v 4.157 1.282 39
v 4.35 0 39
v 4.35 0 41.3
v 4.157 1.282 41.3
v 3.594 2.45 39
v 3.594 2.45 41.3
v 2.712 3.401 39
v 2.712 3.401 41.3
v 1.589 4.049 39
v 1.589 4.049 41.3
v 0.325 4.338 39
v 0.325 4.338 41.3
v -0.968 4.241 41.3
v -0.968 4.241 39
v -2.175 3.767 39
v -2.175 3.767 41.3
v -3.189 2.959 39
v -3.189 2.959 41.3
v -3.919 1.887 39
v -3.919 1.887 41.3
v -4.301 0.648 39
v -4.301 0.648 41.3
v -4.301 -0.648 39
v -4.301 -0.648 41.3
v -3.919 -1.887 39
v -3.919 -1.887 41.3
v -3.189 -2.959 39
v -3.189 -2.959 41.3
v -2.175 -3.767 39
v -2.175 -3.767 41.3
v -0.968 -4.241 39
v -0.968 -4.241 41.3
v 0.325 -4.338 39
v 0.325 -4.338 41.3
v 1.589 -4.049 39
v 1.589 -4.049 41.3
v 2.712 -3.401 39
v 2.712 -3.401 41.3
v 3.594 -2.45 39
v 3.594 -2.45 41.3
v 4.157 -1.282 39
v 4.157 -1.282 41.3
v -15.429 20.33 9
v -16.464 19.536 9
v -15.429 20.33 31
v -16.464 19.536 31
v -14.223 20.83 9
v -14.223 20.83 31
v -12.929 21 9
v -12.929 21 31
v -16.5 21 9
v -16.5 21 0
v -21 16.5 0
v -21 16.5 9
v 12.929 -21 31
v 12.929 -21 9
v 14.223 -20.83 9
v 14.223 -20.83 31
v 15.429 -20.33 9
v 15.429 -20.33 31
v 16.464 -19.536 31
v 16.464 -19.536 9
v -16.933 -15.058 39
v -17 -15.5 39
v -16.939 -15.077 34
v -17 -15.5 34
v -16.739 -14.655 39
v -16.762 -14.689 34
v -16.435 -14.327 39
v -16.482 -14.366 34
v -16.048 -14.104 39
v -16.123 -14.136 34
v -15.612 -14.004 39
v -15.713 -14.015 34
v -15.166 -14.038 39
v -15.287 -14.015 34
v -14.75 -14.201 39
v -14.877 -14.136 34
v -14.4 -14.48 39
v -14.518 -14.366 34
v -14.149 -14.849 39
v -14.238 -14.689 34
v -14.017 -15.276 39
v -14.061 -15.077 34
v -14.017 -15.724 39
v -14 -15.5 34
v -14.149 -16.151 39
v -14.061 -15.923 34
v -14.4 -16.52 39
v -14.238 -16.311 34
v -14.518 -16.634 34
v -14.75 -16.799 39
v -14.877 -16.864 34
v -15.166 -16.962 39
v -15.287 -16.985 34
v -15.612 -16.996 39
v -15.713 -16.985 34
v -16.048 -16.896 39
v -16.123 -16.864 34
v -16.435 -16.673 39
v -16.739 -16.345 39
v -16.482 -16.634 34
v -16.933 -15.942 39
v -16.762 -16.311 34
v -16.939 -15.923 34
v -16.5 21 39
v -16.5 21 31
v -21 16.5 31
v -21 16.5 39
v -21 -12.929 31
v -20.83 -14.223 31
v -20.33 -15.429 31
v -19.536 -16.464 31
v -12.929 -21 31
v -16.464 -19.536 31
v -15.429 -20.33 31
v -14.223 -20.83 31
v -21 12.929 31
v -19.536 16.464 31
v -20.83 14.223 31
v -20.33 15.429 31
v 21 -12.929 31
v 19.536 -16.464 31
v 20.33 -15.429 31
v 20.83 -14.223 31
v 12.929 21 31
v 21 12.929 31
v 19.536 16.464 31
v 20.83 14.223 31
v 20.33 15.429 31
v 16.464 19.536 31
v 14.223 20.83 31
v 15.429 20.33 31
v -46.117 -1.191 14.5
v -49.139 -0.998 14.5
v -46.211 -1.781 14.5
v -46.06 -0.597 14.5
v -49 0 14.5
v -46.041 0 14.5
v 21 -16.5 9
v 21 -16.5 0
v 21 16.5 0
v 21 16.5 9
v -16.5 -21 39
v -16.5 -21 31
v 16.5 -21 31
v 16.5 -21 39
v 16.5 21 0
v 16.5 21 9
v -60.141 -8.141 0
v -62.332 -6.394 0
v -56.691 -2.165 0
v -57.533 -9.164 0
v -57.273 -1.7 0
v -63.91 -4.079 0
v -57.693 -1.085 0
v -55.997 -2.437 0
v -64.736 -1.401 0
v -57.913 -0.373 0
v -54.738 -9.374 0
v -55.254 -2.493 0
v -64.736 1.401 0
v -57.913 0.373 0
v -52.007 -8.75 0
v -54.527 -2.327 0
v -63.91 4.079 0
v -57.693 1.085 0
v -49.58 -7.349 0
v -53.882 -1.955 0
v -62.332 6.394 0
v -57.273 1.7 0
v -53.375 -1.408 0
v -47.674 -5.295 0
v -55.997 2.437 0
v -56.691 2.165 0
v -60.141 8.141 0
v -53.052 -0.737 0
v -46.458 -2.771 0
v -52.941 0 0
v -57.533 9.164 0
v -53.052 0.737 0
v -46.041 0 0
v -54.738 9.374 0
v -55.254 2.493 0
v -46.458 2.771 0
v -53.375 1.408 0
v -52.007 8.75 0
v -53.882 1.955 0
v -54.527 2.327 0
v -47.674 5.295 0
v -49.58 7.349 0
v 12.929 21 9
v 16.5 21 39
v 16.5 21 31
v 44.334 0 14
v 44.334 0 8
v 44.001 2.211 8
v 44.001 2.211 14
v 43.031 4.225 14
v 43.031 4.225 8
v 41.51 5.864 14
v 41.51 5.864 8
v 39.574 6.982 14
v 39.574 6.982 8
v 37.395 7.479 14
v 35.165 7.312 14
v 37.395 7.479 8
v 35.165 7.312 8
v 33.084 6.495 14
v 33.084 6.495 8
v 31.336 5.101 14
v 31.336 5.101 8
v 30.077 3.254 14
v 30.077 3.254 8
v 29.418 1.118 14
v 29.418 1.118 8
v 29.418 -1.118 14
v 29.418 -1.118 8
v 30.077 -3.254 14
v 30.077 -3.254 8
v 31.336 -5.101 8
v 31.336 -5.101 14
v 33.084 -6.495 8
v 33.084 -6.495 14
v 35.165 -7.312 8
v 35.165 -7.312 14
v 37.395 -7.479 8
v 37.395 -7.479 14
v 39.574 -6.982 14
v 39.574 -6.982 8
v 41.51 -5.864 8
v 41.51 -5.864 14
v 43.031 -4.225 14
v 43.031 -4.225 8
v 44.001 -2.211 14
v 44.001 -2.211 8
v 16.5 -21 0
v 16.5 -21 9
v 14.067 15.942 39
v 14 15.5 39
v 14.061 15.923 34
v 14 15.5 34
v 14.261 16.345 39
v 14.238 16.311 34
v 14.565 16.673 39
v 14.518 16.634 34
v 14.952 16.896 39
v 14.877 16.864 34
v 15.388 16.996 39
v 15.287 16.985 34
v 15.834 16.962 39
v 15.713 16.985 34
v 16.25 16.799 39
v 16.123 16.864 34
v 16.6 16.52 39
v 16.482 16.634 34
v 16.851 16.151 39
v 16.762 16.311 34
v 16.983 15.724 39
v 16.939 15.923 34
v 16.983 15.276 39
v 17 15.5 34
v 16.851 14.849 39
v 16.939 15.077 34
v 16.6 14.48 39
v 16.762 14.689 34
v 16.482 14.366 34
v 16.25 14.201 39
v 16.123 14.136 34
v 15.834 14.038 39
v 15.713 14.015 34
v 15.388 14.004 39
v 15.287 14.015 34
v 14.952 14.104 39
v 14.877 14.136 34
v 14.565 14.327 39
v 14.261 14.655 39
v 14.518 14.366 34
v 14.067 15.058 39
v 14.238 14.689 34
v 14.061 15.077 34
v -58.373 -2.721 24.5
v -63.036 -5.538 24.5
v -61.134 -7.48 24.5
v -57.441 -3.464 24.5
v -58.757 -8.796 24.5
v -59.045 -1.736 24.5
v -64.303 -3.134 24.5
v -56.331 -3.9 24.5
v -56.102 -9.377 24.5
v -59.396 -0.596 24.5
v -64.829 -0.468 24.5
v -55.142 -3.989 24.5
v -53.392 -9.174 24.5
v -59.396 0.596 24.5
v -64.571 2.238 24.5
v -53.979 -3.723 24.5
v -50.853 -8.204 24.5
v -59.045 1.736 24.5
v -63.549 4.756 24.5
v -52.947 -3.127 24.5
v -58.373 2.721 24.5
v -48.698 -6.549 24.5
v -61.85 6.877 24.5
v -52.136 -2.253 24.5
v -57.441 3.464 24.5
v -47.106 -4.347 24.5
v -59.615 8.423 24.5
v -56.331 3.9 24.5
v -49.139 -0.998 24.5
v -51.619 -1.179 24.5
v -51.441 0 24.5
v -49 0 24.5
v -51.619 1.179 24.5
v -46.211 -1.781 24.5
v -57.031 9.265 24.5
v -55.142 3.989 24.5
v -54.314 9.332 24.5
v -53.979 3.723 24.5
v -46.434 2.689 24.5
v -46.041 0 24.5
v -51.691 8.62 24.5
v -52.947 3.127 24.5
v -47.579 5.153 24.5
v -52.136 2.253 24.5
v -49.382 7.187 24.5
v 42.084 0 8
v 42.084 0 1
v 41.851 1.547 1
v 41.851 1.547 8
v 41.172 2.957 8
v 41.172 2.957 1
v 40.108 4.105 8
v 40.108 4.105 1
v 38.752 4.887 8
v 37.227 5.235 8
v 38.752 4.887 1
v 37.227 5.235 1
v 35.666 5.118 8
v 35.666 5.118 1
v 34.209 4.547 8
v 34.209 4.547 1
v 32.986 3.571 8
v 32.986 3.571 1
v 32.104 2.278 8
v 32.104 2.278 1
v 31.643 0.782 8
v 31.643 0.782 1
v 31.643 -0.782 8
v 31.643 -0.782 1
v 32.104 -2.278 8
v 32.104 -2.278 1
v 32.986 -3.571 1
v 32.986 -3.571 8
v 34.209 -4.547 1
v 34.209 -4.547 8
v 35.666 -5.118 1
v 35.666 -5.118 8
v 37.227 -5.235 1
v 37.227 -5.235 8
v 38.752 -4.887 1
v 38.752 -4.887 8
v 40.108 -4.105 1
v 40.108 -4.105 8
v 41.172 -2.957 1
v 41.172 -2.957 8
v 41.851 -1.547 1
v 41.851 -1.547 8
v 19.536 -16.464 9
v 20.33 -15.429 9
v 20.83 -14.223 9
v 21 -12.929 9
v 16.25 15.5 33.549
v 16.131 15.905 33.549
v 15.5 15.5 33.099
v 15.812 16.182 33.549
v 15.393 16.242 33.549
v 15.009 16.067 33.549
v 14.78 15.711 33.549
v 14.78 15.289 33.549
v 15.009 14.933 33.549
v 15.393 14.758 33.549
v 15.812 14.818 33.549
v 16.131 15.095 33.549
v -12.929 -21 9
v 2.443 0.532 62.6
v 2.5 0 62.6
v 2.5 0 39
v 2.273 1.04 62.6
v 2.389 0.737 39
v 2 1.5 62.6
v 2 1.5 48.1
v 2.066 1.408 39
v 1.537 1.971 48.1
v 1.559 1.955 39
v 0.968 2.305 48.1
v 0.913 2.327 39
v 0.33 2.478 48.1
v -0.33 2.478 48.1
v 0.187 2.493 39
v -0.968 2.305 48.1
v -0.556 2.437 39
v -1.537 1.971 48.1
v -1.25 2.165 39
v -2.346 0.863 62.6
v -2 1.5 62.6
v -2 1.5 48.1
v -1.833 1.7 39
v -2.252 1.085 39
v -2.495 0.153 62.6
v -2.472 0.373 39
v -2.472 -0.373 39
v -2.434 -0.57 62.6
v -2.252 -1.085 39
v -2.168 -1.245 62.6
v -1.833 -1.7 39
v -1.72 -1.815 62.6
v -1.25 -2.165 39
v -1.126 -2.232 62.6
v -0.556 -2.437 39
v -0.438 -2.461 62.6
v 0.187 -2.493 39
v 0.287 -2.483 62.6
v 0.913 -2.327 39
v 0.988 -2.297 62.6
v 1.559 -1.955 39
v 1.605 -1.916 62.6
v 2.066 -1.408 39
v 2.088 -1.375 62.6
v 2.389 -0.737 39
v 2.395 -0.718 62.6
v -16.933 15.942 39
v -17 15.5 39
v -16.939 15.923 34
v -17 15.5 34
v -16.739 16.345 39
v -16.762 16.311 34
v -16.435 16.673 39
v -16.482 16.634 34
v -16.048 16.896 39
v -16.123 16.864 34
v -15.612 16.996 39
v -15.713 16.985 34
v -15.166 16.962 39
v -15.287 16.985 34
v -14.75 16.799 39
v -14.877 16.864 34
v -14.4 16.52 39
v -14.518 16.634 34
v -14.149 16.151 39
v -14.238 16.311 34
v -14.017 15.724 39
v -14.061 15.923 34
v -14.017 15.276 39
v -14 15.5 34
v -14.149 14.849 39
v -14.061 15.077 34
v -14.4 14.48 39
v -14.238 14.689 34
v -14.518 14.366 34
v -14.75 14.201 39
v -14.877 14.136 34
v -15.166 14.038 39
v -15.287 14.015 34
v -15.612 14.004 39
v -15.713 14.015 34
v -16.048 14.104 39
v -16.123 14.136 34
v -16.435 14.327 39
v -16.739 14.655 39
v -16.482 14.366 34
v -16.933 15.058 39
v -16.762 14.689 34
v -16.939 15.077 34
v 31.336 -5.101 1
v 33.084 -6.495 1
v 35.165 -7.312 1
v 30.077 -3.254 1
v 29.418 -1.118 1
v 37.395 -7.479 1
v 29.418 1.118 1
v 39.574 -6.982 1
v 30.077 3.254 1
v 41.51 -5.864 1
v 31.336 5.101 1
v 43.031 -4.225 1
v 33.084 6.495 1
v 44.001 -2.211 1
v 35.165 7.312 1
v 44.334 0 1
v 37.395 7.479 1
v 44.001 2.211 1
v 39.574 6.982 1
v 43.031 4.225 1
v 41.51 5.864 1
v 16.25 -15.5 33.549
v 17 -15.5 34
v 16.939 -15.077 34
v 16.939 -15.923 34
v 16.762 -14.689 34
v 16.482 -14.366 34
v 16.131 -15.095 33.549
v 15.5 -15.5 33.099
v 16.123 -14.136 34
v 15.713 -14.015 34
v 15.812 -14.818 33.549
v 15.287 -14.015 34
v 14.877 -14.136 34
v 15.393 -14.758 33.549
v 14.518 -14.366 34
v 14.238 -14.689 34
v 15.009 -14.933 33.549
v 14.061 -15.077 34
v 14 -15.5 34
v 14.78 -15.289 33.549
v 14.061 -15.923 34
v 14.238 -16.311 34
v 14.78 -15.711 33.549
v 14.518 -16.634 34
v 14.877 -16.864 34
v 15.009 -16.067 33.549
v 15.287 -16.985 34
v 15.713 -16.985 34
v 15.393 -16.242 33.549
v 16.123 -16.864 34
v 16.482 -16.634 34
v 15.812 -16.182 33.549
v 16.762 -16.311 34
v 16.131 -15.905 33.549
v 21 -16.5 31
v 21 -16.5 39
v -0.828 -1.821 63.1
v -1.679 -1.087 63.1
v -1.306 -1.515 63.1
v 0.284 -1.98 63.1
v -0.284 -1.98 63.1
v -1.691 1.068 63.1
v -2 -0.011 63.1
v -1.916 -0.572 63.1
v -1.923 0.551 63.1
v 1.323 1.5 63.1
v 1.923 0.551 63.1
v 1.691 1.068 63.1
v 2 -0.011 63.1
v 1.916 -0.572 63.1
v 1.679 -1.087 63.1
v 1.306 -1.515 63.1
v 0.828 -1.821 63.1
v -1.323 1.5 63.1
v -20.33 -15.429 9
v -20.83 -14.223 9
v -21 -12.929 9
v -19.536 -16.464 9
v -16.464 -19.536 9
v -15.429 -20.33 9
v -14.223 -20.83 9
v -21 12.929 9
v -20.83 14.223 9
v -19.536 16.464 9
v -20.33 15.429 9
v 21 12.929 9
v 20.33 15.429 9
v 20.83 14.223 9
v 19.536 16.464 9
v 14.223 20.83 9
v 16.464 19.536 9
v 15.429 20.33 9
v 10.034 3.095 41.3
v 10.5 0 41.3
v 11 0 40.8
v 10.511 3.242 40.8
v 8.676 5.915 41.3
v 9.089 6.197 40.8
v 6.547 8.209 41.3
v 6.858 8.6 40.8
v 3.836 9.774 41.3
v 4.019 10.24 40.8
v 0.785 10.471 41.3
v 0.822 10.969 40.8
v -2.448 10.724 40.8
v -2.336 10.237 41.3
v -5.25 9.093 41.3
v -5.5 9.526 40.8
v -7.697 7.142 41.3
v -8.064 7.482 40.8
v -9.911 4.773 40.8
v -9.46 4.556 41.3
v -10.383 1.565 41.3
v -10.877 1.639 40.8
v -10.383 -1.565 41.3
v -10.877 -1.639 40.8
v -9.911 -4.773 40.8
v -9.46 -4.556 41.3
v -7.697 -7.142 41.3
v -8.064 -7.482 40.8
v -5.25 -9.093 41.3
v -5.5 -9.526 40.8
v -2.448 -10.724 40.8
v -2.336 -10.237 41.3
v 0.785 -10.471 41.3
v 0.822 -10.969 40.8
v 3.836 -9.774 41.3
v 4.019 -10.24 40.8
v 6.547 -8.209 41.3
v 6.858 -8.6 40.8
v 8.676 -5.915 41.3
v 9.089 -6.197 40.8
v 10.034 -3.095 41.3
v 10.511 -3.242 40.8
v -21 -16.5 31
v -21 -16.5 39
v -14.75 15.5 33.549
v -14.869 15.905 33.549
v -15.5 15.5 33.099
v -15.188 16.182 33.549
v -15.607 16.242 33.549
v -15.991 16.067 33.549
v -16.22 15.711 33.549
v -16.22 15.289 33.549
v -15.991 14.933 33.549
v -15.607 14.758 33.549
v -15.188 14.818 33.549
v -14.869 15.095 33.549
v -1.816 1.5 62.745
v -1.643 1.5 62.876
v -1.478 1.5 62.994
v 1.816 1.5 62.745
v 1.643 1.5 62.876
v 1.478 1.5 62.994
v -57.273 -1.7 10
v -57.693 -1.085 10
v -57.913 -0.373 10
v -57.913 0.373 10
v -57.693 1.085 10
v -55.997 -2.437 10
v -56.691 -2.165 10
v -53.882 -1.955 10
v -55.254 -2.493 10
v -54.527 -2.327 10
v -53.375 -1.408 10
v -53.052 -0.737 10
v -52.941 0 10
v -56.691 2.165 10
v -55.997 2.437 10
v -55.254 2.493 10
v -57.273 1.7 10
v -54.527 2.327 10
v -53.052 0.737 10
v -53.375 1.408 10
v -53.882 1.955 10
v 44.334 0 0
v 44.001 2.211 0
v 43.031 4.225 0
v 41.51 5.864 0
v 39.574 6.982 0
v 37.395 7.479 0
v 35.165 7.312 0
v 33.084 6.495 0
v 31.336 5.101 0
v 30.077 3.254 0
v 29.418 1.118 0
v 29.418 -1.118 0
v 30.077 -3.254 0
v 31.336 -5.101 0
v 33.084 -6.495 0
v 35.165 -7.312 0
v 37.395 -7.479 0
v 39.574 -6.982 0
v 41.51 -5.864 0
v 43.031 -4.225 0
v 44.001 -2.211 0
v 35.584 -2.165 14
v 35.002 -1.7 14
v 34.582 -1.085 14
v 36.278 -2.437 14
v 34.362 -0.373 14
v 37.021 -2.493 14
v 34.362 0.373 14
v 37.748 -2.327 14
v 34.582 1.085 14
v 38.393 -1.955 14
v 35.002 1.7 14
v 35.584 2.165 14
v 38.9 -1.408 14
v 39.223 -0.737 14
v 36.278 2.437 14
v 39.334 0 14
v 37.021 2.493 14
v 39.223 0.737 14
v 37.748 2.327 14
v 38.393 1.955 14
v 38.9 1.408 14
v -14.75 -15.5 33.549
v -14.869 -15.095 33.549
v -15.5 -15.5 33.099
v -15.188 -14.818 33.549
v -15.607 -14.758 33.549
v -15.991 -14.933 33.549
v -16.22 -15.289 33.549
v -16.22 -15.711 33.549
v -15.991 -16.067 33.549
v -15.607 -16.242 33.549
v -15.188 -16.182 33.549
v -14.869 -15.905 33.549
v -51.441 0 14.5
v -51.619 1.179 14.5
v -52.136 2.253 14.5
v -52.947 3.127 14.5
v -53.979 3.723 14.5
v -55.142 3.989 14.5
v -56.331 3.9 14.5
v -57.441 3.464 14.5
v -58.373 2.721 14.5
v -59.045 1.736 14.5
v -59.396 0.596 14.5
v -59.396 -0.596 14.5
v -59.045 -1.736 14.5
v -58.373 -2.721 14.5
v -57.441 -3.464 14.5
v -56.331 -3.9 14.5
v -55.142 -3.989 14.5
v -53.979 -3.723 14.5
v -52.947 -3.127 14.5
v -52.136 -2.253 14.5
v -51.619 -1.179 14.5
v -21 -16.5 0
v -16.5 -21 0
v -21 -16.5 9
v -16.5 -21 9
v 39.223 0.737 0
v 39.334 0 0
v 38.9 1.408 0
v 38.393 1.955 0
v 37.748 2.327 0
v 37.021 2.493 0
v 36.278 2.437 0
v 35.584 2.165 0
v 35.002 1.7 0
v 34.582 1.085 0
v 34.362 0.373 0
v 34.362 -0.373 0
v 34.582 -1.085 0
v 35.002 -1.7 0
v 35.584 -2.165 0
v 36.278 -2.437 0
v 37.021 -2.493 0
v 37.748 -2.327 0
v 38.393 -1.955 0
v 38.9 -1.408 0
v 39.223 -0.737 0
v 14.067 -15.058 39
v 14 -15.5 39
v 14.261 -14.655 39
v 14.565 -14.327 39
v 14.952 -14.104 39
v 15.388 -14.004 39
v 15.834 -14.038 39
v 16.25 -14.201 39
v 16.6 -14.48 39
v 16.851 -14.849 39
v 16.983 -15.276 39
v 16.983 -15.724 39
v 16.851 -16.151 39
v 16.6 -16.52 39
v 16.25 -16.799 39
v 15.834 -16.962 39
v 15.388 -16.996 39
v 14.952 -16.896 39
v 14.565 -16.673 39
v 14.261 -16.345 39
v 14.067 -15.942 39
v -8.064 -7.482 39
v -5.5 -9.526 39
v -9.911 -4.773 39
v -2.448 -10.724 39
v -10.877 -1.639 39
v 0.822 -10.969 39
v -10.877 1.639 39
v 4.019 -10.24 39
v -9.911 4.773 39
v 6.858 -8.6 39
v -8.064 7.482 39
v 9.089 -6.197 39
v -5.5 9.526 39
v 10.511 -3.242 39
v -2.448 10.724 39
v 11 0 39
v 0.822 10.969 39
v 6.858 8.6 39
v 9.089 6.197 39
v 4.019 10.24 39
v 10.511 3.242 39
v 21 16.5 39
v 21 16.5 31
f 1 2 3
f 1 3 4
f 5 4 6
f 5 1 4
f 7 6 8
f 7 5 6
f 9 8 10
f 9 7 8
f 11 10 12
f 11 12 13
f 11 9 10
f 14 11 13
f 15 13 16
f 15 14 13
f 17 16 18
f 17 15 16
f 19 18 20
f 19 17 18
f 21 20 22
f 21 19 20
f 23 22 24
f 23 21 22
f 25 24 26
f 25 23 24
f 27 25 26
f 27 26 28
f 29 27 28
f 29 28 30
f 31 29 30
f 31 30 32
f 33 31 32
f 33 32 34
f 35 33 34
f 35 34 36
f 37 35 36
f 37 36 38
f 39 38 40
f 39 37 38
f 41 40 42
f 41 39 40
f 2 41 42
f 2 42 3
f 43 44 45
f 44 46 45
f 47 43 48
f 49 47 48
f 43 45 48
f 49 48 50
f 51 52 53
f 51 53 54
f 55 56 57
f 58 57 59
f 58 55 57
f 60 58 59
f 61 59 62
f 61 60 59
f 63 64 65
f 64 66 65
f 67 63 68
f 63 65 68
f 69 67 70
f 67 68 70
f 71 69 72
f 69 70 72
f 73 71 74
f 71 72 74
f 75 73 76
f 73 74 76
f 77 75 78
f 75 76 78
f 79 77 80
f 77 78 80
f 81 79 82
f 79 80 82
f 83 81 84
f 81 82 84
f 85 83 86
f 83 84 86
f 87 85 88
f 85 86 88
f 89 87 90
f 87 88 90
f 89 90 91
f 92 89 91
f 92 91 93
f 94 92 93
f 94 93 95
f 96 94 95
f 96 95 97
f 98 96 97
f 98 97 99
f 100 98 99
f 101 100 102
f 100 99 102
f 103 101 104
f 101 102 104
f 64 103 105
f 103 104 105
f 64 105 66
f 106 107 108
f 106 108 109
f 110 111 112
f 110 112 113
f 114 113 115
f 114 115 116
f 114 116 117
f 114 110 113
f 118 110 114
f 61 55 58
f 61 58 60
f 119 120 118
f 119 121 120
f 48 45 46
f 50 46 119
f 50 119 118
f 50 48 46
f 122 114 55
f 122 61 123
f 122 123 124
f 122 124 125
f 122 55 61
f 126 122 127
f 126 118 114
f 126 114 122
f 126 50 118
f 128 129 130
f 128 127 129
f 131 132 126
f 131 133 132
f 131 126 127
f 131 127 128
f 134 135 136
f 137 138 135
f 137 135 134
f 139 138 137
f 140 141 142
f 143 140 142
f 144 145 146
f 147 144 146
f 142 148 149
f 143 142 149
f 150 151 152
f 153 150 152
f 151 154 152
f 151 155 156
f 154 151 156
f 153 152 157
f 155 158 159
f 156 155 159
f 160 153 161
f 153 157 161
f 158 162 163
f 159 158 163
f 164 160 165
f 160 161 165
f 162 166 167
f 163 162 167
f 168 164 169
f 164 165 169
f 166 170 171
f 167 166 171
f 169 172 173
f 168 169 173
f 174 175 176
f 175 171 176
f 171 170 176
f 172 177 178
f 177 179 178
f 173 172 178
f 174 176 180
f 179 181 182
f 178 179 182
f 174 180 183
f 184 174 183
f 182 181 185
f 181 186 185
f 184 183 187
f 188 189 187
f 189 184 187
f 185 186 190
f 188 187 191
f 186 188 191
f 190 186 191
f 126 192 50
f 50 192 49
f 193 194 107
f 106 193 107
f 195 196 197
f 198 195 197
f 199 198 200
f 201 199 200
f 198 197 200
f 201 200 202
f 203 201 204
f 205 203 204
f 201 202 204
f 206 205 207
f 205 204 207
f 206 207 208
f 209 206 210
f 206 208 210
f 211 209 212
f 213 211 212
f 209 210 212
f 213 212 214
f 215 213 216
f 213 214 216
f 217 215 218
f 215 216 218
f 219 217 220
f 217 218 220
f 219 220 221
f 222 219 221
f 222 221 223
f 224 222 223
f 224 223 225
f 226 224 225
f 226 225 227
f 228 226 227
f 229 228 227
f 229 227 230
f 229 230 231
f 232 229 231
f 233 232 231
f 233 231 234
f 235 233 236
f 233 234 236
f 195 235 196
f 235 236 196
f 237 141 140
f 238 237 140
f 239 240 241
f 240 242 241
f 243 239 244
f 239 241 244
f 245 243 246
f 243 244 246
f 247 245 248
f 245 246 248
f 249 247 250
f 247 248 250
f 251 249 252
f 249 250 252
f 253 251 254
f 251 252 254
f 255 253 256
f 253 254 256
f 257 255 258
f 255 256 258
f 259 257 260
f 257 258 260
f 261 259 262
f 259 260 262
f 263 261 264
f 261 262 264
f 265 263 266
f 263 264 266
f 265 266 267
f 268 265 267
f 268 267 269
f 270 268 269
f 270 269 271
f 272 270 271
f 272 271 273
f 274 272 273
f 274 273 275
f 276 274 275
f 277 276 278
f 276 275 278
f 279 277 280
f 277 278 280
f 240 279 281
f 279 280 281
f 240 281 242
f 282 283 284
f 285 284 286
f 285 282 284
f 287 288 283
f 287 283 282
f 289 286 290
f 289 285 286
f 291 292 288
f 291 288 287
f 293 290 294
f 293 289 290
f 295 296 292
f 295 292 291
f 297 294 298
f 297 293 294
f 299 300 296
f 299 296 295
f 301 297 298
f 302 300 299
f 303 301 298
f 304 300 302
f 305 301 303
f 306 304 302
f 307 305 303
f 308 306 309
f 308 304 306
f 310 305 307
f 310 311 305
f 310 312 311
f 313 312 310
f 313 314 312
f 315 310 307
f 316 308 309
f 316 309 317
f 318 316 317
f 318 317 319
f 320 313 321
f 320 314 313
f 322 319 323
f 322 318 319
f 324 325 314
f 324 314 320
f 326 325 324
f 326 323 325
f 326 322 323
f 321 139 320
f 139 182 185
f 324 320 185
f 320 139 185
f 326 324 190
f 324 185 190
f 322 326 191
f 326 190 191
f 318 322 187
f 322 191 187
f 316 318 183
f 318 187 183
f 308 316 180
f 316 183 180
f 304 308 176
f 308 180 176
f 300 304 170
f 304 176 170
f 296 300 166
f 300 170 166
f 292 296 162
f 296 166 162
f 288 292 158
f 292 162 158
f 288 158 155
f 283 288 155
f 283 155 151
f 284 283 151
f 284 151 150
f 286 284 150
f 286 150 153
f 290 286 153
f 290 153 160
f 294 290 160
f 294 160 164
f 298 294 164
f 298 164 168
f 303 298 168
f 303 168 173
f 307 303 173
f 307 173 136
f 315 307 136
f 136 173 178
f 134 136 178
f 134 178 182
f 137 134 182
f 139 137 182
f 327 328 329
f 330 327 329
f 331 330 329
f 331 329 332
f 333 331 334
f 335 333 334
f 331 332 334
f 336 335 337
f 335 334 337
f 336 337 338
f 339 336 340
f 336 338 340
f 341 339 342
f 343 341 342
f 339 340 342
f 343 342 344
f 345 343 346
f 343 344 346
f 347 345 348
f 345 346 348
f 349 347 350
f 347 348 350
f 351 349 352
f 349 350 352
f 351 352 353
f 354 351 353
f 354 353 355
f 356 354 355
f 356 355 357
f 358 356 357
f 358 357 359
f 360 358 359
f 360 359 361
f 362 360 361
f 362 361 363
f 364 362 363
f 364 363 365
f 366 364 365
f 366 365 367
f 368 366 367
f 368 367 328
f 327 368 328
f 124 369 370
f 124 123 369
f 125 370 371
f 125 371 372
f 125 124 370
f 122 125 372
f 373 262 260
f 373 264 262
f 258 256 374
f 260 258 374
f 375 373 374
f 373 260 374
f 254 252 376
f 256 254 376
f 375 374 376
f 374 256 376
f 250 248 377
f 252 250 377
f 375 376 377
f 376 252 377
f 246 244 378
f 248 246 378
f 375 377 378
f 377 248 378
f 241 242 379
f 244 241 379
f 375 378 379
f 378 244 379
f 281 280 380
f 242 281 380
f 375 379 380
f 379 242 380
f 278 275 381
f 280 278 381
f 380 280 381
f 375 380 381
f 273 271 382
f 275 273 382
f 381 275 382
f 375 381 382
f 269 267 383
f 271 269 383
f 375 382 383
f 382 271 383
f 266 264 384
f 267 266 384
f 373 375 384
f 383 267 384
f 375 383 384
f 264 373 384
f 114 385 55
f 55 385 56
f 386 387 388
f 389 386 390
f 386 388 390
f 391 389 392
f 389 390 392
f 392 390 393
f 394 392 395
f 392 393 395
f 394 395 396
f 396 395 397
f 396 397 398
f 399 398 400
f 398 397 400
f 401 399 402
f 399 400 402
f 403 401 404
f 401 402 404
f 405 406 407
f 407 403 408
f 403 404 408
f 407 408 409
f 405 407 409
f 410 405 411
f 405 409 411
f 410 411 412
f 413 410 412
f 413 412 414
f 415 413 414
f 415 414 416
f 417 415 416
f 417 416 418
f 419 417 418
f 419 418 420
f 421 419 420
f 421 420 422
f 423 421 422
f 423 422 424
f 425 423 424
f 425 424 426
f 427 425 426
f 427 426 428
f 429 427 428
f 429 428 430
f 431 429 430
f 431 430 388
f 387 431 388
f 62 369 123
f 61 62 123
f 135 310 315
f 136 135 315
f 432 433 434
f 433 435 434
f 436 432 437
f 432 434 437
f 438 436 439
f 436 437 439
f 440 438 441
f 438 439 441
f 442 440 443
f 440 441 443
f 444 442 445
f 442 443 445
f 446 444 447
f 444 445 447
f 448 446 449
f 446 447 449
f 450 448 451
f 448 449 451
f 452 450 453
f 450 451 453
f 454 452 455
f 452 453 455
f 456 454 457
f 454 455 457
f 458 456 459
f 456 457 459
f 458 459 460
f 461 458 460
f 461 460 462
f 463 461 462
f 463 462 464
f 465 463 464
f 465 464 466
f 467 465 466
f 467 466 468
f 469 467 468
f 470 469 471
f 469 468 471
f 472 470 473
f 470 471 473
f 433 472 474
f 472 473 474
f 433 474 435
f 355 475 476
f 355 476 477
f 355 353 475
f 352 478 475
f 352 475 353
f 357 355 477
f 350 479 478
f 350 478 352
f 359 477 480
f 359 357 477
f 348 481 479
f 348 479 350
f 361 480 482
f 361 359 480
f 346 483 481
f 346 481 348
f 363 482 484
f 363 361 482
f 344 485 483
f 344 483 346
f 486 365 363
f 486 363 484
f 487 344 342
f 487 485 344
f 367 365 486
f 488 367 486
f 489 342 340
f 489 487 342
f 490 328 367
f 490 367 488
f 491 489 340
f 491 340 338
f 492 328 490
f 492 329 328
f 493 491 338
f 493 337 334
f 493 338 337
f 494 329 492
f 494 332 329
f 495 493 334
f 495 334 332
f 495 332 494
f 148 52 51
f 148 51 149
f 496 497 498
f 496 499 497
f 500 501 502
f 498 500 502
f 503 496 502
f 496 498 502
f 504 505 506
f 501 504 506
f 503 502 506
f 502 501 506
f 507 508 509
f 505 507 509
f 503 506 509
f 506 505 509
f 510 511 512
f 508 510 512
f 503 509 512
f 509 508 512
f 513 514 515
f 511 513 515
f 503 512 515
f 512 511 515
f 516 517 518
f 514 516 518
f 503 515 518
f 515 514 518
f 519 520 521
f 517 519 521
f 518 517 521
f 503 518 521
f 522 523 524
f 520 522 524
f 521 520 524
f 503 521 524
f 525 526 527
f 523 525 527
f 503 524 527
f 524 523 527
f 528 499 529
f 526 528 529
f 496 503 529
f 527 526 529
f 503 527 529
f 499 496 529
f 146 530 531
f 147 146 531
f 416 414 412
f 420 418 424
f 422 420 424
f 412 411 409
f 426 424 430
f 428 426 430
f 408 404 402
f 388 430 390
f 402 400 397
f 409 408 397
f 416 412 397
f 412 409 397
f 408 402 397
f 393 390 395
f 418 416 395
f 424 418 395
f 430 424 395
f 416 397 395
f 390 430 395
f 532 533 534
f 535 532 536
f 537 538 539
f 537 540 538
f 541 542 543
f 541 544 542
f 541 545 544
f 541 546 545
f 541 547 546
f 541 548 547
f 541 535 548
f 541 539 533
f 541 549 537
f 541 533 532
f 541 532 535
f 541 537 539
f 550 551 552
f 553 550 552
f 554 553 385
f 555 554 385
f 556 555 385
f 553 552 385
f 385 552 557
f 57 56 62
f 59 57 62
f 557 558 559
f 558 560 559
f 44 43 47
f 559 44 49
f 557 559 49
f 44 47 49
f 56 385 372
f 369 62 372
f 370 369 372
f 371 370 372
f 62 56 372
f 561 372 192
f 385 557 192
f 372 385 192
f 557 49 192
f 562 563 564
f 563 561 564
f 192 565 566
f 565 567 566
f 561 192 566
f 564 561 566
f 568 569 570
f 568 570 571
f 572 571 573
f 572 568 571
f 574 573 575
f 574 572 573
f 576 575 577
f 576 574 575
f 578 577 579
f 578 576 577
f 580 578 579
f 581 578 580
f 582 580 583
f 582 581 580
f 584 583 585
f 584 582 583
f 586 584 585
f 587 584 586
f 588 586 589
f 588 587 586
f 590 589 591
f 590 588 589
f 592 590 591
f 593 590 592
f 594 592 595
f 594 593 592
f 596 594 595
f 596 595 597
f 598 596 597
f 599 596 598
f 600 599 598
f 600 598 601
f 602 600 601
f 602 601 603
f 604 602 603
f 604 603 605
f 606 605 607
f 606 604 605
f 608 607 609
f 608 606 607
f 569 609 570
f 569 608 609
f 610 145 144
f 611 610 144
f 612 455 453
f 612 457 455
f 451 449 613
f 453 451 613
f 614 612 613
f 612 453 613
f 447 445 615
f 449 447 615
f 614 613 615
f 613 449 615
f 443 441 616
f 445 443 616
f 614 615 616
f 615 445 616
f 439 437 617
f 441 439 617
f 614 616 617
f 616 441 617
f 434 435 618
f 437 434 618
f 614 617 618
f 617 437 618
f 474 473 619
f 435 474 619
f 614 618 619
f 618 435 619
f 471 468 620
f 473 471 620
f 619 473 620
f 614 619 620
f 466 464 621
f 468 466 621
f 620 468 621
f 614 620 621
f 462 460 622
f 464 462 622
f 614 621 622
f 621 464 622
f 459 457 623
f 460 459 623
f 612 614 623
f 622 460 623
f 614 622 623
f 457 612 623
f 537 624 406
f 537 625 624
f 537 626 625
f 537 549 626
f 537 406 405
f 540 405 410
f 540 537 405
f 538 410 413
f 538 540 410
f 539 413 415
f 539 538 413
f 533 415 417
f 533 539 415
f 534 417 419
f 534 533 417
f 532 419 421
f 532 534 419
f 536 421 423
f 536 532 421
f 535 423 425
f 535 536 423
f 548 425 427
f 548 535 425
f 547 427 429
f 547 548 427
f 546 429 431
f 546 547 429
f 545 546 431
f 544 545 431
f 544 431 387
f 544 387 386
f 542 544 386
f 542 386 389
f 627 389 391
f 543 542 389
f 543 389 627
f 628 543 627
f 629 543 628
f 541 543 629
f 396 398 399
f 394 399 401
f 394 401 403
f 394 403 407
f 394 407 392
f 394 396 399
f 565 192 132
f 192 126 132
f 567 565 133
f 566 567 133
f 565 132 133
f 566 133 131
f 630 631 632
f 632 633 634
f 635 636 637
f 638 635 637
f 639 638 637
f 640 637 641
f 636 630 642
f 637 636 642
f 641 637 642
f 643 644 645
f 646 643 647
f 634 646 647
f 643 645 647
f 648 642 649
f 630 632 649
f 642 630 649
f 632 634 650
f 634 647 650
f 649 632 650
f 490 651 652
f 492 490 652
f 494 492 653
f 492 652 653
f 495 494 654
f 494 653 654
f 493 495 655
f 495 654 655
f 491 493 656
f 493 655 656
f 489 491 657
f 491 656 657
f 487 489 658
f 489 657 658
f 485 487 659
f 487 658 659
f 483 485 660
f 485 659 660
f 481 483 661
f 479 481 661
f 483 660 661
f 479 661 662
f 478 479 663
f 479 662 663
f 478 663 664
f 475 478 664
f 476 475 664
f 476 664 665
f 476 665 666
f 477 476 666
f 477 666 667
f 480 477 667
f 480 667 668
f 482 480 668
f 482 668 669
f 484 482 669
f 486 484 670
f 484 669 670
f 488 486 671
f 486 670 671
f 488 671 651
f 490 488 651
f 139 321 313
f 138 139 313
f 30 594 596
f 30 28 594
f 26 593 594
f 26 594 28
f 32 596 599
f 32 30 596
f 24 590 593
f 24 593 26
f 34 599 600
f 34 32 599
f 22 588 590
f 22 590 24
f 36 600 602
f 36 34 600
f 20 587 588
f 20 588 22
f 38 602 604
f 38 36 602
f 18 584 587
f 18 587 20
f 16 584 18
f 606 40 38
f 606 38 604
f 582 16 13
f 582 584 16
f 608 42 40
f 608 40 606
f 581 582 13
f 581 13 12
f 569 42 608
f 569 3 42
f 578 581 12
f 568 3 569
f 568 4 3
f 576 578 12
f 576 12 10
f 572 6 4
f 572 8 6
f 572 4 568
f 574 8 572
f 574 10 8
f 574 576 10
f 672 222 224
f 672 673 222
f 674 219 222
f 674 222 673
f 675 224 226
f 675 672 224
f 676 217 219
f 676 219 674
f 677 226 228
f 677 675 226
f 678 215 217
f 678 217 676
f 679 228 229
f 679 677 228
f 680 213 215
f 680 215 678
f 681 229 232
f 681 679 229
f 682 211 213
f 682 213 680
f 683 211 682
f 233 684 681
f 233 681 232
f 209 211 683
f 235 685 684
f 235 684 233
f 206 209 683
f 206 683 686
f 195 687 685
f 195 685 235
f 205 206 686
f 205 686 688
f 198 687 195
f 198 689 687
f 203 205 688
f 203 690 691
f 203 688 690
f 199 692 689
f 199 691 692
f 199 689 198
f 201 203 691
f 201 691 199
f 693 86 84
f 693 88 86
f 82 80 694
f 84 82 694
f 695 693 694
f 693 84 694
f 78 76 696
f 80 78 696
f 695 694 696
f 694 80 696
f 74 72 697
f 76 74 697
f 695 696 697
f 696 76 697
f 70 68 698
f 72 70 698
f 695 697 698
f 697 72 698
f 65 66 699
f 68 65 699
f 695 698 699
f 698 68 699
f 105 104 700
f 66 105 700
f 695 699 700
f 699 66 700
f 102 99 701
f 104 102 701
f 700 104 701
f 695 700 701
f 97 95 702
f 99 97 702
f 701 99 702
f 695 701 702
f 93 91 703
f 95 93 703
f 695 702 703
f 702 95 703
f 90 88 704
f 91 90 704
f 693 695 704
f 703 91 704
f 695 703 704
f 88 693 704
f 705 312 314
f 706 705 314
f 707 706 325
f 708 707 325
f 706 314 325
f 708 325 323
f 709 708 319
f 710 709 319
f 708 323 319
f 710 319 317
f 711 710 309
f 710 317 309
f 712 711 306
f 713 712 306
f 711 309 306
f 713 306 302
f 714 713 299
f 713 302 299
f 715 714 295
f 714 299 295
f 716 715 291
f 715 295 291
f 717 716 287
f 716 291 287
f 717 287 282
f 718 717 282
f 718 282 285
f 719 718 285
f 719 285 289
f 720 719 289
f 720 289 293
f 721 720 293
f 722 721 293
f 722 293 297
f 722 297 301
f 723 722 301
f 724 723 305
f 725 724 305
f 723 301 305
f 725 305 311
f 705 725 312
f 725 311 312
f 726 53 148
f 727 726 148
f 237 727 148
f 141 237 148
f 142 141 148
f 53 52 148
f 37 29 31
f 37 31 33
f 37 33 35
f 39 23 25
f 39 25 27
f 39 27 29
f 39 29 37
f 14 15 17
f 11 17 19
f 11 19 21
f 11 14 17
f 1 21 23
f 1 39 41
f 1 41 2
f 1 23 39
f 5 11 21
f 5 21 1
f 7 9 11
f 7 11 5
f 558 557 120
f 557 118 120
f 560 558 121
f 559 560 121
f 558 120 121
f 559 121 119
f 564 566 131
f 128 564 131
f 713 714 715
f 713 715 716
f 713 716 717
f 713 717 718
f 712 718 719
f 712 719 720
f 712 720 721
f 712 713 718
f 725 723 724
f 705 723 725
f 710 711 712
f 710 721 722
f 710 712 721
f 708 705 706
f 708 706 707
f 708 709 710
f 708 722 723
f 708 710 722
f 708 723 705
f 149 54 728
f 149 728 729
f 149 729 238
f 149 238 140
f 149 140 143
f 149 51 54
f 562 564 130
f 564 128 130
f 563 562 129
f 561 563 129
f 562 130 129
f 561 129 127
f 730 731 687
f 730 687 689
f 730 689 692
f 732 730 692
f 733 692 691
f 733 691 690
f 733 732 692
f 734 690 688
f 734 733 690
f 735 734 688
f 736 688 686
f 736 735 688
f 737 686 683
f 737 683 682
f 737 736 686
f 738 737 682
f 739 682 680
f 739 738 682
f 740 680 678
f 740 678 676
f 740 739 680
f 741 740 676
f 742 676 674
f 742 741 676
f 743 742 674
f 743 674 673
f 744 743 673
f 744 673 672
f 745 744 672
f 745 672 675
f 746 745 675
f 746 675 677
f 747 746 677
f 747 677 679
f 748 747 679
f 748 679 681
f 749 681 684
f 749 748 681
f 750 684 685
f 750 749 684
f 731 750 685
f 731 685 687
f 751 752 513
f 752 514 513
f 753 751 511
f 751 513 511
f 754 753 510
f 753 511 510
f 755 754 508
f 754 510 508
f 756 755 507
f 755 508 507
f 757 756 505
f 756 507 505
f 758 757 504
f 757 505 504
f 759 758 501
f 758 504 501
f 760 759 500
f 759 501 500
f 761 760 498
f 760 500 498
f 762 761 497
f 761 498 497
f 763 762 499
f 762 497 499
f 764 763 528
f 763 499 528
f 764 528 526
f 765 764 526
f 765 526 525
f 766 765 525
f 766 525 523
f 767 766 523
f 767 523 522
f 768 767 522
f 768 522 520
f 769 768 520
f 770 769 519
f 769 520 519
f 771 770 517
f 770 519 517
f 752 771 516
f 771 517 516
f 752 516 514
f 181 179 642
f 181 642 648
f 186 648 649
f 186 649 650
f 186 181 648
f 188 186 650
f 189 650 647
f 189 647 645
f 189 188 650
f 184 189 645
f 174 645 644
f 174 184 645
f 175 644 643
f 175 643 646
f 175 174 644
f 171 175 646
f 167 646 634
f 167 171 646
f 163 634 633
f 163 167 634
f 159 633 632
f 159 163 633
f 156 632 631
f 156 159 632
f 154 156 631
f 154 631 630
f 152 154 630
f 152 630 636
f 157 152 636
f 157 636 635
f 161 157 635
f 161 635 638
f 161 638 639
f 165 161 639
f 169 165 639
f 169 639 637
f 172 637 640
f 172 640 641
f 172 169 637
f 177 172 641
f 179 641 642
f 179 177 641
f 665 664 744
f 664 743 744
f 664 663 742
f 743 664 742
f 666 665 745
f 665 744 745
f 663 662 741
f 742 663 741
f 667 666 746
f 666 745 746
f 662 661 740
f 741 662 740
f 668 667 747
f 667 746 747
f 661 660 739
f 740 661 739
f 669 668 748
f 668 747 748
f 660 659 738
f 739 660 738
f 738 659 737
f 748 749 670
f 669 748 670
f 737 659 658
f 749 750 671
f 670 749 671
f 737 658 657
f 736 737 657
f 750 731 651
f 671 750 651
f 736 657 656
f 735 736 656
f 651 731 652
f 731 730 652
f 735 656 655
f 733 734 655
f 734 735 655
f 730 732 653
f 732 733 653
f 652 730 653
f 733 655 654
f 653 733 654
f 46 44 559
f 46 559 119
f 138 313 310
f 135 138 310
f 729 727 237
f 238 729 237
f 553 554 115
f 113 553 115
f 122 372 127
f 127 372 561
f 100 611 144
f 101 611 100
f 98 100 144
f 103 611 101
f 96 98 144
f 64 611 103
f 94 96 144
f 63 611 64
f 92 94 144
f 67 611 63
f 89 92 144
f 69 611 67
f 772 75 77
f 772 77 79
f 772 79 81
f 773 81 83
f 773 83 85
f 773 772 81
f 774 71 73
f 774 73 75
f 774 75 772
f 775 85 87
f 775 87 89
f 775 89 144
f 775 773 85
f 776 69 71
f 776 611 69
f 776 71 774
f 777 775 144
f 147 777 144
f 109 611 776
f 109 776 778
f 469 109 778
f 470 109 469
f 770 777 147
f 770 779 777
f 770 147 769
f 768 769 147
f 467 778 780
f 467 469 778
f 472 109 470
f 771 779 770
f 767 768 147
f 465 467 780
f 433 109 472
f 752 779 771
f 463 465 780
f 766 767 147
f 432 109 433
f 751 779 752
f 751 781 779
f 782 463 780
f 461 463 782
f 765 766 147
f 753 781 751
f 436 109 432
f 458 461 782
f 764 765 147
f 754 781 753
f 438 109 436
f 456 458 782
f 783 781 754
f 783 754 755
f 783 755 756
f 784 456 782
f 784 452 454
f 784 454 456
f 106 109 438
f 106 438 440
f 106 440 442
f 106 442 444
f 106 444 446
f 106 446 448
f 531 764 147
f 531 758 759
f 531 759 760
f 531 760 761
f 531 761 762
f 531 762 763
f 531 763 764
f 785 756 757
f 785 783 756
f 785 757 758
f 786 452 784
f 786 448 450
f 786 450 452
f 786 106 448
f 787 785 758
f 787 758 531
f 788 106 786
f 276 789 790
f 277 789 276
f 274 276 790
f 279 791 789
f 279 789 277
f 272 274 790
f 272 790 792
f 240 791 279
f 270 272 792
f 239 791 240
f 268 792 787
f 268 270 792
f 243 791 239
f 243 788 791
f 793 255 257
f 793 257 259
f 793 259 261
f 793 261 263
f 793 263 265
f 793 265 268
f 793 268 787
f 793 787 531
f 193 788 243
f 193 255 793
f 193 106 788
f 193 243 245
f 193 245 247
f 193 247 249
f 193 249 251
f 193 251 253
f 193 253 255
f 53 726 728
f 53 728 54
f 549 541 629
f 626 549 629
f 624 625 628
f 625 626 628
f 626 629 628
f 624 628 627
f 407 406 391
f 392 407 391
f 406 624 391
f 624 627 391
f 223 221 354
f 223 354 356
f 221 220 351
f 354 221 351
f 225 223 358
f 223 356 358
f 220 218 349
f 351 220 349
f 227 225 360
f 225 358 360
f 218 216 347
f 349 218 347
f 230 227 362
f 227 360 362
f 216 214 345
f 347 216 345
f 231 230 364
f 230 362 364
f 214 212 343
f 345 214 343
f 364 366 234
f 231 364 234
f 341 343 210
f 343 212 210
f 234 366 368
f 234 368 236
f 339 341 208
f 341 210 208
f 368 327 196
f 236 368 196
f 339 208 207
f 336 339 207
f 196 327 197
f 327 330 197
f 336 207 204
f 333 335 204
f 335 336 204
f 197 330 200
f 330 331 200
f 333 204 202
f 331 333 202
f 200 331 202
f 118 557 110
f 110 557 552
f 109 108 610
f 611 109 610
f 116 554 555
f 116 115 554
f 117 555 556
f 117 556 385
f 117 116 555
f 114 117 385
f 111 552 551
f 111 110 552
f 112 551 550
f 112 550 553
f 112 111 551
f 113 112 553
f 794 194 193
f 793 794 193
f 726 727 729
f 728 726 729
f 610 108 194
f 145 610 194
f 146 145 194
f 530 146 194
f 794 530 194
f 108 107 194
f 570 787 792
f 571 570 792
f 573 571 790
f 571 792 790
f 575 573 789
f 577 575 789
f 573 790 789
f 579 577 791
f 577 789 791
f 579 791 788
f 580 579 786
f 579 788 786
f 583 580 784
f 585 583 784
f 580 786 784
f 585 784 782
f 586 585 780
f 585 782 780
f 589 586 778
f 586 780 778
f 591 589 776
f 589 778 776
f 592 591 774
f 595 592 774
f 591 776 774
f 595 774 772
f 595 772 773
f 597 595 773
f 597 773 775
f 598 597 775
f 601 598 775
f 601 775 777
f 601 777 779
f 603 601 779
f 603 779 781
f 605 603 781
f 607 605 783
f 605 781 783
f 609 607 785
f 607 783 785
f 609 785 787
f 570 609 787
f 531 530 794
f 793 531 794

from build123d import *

# Parameters (mm, degrees)
F0_W      = 42
F0_H      = 42
F1_DEPTH  = 9
F2_SIZE   = 4.5
F4_DEPTH  = 22
F5_SIZE   = 6
F6_R      = 5
F8_DEPTH  = 8
F9_SIZE   = 4.5
F10_R     = 11
F10_R_2   = 4.35
F11_DEPTH = 2.3
F10_R_3   = 2.5
F12_DEPTH = 24.1
F14_DEPTH = 15
F15_SIZE  = 0.5
F16_SIZE  = 0.5
F17_D     = 3
F17_DEPTH = 5
F17_TIP   = 0.9012909285
F18_R     = 9.4
F18_R_2   = 2.5
F19_DEPTH = 24.5
F20_DEPTH = 10
F21_R     = 4
F22_DEPTH = 10
F23_R     = 7.5
F23_R_2   = 5.25
F24_DEPTH = 1
F23_R_3   = 2.5
F25_DEPTH = 8
F26_R     = 7.5
F26_R_2   = 5.25
F27_DEPTH = 6
F28_DEPTH = 14


with BuildPart() as f1:
    # F0 (on Top) → F1 (new body)
    with BuildSketch(Plane.XY):
        Rectangle(F0_W, F0_H)
    extrude(amount=F1_DEPTH)

    # F2
    f2_edges = [f1.edges().sort_by_distance(p)[0] for p in [
        (-21, -21, 4.5),
        (21, -21, 4.5),
        (-21, 21, 4.5),
        (21, 21, 4.5),
    ]]
    chamfer(f2_edges, length=F2_SIZE)


with BuildPart() as f4:
    # F3 (on face) → F4 (new body)
    with BuildSketch(Plane.XY.offset(9)):
        Polygon((21, 16.5), (16.5, 21), (-16.5, 21), (-21, 16.5), (-21, -16.5), (-16.5, -21), (16.5, -21), (21, -16.5), align=None)
        Polygon((-21, 16.5), (-16.5, 21), (-21, 21), align=None)
        Polygon((21, 16.5), (21, 21), (16.5, 21), align=None)
        Polygon((-16.5, -21), (-21, -16.5), (-21, -21), align=None)
        Polygon((21, -21), (21, -16.5), (16.5, -21), align=None)
    extrude(amount=F4_DEPTH)

    # F5
    f5_edges = [f4.edges().sort_by_distance(p)[0] for p in [
        (-21, 21, 20),
        (-21, -21, 20),
        (21, 21, 20),
        (21, -21, 20),
    ]]
    chamfer(f5_edges, length=F5_SIZE)

    # F6
    f6_edges = [f4.edges().sort_by_distance(p)[0] for p in [
        (-15, 21, 20),
        (-21, 15, 20),
        (-21, -15, 20),
        (-15, -21, 20),
        (15, -21, 20),
        (21, -15, 20),
        (21, 15, 20),
        (15, 21, 20),
    ]]
    fillet(f6_edges, radius=F6_R)


with BuildPart() as f8:
    # F7 (on face) → F8 (new body)
    with BuildSketch(Plane.XY.offset(31)):
        with BuildLine():
            Line((12.9289321881, 21), (-12.9289321881, 21))
            ThreePointArc((-12.9289321881, 21), (-14.84234935, 20.6193976626), (-16.4644660941, 19.5355339059))
            Line((-16.4644660941, 19.5355339059), (-19.5355339059, 16.4644660941))
            ThreePointArc((-19.5355339059, 16.4644660941), (-20.6193976626, 14.84234935), (-21, 12.9289321881))
            Line((-21, 12.9289321881), (-21, -12.9289321881))
            ThreePointArc((-21, -12.9289321881), (-20.6193976626, -14.84234935), (-19.5355339059, -16.4644660941))
            Line((-19.5355339059, -16.4644660941), (-16.4644660941, -19.5355339059))
            ThreePointArc((-16.4644660941, -19.5355339059), (-14.84234935, -20.6193976626), (-12.9289321881, -21))
            Line((-12.9289321881, -21), (12.9289321881, -21))
            ThreePointArc((12.9289321881, -21), (14.84234935, -20.6193976626), (16.4644660941, -19.5355339059))
            Line((16.4644660941, -19.5355339059), (19.5355339059, -16.4644660941))
            ThreePointArc((19.5355339059, -16.4644660941), (20.6193976626, -14.84234935), (21, -12.9289321881))
            Line((21, -12.9289321881), (21, 12.9289321881))
            ThreePointArc((21, 12.9289321881), (20.6193976626, 14.84234935), (19.5355339059, 16.4644660941))
            Line((19.5355339059, 16.4644660941), (16.4644660941, 19.5355339059))
            ThreePointArc((16.4644660941, 19.5355339059), (14.84234935, 20.6193976626), (12.9289321881, 21))
        make_face()
        with BuildLine():
            Line((-12.9289321881, 21), (-21, 21))
            Line((-21, 21), (-21, 12.9289321881))
            ThreePointArc((-21, 12.9289321881), (-20.6193976626, 14.84234935), (-19.5355339059, 16.4644660941))
            Line((-19.5355339059, 16.4644660941), (-16.4644660941, 19.5355339059))
            ThreePointArc((-16.4644660941, 19.5355339059), (-14.84234935, 20.6193976626), (-12.9289321881, 21))
        make_face()
        with BuildLine():
            Line((21, 21), (12.9289321881, 21))
            ThreePointArc((12.9289321881, 21), (14.84234935, 20.6193976626), (16.4644660941, 19.5355339059))
            Line((16.4644660941, 19.5355339059), (19.5355339059, 16.4644660941))
            ThreePointArc((19.5355339059, 16.4644660941), (20.6193976626, 14.84234935), (21, 12.9289321881))
            Line((21, 12.9289321881), (21, 21))
        make_face()
        with BuildLine():
            ThreePointArc((-19.5355339059, -16.4644660941), (-20.6193976626, -14.84234935), (-21, -12.9289321881))
            Line((-21, -12.9289321881), (-21, -21))
            Line((-21, -21), (-12.9289321881, -21))
            ThreePointArc((-12.9289321881, -21), (-14.84234935, -20.6193976626), (-16.4644660941, -19.5355339059))
            Line((-16.4644660941, -19.5355339059), (-19.5355339059, -16.4644660941))
        make_face()
        with BuildLine():
            Line((21, -21), (21, -12.9289321881))
            ThreePointArc((21, -12.9289321881), (20.6193976626, -14.84234935), (19.5355339059, -16.4644660941))
            Line((19.5355339059, -16.4644660941), (16.4644660941, -19.5355339059))
            ThreePointArc((16.4644660941, -19.5355339059), (14.84234935, -20.6193976626), (12.9289321881, -21))
            Line((12.9289321881, -21), (21, -21))
        make_face()
    extrude(amount=F8_DEPTH)

    # F9
    f9_edges = [f8.edges().sort_by_distance(p)[0] for p in [
        (-21, 21, 35),
        (21, 21, 35),
        (-21, -21, 35),
        (21, -21, 35),
    ]]
    chamfer(f9_edges, length=F9_SIZE)

    # F10 (on face) → F11 (join)
    with BuildSketch(Plane.XY.offset(39)):
        Circle(F10_R)
        Circle(F10_R_2, mode=Mode.SUBTRACT)
    extrude(amount=F11_DEPTH)

    # F16
    f16_edges = [f8.edges().sort_by_distance(p)[0] for p in [
        (-11, 0, 41.3),
    ]]
    chamfer(f16_edges, length=F16_SIZE)

    # F17
    with Locations(Plane.XY.offset(39)):
        with Locations((-15.5, 15.5), (15.5, 15.5), (15.5, -15.5), (-15.5, -15.5)):
            Hole(F17_D / 2, depth=F17_DEPTH)
            with Locations((0, 0, -(F17_DEPTH + F17_TIP / 2))):  # 118° drill point
                Cone(0, F17_D / 2, F17_TIP, mode=Mode.SUBTRACT)


with BuildPart() as f12:
    # F10 (on face) → F12 (new body)
    with BuildSketch(Plane.XY.offset(39)):
        Circle(F10_R_3)
    extrude(amount=F12_DEPTH)

    # F13 (on face) → F14 (cut)
    with BuildSketch(Plane.XY.offset(63.1)):
        with BuildLine():
            ThreePointArc((2, 1.5), (0, 2.5), (-2, 1.5))
            Line((-2, 1.5), (2, 1.5))
        make_face()
    extrude(amount=-F14_DEPTH, mode=Mode.SUBTRACT)

    # F15
    f15_edges = [f12.edges().sort_by_distance(p)[0] for p in [
        (-0.790569, -2.371708, 63.1),
    ]]
    chamfer(f15_edges, length=F15_SIZE)


with BuildPart() as f19:
    # F18 (on Top) → F19 (new body)
    with BuildSketch(Plane.XY):
        with Locations((-55.4408369965, 0)):
            Circle(F18_R)
        with Locations((-55.4408369965, 0)):
            Circle(F18_R_2, mode=Mode.SUBTRACT)
        with Locations((-55.4408369965, 0)):
            Circle(F18_R_2)
    extrude(amount=F19_DEPTH)

    # F18 (on Top) → F20 (cut)
    with BuildSketch(Plane.XY):
        with Locations((-55.4408369965, 0)):
            Circle(F18_R_2)
    extrude(amount=F20_DEPTH, mode=Mode.SUBTRACT)

    # F21 (on face) → F22 (cut)
    with BuildSketch(Plane.XY.offset(24.5)):
        with Locations((-55.4408369965, 0)):
            Circle(F21_R)
        with BuildLine():
            ThreePointArc((-46.211009649, -1.7805300153), (-46.0834768702, -0.8943217915), (-46.0408369965, 0))
            Line((-46.0408369965, 0), (-48.9998832345, 0))
            Line((-48.9998832345, 0), (-49.1390116513, -0.99807058))
            Line((-49.1390116513, -0.99807058), (-46.211009649, -1.7805300153))
        make_face()
    extrude(amount=-F22_DEPTH, mode=Mode.SUBTRACT)


with BuildPart() as f24:
    # F23 (on Top) → F24 (new body)
    with BuildSketch(Plane.XY):
        with Locations((36.8342996833, 0)):
            Circle(F23_R)
        with Locations((36.8342996833, 0)):
            Circle(F23_R_2, mode=Mode.SUBTRACT)
    extrude(amount=F24_DEPTH)

    # F23 (on Top) → F25 (join)
    with BuildSketch(Plane.XY):
        with Locations((36.8342996833, 0)):
            Circle(F23_R_2)
        with Locations((36.8342996833, 0)):
            Circle(F23_R_3, mode=Mode.SUBTRACT)
        with Locations((36.8342996833, 0)):
            Circle(F23_R_3)
    extrude(amount=F25_DEPTH)

    # F26 (on face) → F27 (join)
    with BuildSketch(Plane.XY.offset(8)):
        with Locations((36.8342996833, 0)):
            Circle(F26_R)
        with Locations((36.8342996833, 0)):
            Circle(F26_R_2, mode=Mode.SUBTRACT)
        with Locations((36.8342996833, 0)):
            Circle(F26_R_2)
    extrude(amount=F27_DEPTH)

    # F23 (on Top) → F28 (cut, through all)
    with BuildSketch(Plane.XY):
        with Locations((36.8342996833, 0)):
            Circle(F23_R_3)
    extrude(amount=F28_DEPTH, mode=Mode.SUBTRACT)


solid = Compound([f1.part, f4.part, f8.part, f12.part, f19.part, f24.part])
